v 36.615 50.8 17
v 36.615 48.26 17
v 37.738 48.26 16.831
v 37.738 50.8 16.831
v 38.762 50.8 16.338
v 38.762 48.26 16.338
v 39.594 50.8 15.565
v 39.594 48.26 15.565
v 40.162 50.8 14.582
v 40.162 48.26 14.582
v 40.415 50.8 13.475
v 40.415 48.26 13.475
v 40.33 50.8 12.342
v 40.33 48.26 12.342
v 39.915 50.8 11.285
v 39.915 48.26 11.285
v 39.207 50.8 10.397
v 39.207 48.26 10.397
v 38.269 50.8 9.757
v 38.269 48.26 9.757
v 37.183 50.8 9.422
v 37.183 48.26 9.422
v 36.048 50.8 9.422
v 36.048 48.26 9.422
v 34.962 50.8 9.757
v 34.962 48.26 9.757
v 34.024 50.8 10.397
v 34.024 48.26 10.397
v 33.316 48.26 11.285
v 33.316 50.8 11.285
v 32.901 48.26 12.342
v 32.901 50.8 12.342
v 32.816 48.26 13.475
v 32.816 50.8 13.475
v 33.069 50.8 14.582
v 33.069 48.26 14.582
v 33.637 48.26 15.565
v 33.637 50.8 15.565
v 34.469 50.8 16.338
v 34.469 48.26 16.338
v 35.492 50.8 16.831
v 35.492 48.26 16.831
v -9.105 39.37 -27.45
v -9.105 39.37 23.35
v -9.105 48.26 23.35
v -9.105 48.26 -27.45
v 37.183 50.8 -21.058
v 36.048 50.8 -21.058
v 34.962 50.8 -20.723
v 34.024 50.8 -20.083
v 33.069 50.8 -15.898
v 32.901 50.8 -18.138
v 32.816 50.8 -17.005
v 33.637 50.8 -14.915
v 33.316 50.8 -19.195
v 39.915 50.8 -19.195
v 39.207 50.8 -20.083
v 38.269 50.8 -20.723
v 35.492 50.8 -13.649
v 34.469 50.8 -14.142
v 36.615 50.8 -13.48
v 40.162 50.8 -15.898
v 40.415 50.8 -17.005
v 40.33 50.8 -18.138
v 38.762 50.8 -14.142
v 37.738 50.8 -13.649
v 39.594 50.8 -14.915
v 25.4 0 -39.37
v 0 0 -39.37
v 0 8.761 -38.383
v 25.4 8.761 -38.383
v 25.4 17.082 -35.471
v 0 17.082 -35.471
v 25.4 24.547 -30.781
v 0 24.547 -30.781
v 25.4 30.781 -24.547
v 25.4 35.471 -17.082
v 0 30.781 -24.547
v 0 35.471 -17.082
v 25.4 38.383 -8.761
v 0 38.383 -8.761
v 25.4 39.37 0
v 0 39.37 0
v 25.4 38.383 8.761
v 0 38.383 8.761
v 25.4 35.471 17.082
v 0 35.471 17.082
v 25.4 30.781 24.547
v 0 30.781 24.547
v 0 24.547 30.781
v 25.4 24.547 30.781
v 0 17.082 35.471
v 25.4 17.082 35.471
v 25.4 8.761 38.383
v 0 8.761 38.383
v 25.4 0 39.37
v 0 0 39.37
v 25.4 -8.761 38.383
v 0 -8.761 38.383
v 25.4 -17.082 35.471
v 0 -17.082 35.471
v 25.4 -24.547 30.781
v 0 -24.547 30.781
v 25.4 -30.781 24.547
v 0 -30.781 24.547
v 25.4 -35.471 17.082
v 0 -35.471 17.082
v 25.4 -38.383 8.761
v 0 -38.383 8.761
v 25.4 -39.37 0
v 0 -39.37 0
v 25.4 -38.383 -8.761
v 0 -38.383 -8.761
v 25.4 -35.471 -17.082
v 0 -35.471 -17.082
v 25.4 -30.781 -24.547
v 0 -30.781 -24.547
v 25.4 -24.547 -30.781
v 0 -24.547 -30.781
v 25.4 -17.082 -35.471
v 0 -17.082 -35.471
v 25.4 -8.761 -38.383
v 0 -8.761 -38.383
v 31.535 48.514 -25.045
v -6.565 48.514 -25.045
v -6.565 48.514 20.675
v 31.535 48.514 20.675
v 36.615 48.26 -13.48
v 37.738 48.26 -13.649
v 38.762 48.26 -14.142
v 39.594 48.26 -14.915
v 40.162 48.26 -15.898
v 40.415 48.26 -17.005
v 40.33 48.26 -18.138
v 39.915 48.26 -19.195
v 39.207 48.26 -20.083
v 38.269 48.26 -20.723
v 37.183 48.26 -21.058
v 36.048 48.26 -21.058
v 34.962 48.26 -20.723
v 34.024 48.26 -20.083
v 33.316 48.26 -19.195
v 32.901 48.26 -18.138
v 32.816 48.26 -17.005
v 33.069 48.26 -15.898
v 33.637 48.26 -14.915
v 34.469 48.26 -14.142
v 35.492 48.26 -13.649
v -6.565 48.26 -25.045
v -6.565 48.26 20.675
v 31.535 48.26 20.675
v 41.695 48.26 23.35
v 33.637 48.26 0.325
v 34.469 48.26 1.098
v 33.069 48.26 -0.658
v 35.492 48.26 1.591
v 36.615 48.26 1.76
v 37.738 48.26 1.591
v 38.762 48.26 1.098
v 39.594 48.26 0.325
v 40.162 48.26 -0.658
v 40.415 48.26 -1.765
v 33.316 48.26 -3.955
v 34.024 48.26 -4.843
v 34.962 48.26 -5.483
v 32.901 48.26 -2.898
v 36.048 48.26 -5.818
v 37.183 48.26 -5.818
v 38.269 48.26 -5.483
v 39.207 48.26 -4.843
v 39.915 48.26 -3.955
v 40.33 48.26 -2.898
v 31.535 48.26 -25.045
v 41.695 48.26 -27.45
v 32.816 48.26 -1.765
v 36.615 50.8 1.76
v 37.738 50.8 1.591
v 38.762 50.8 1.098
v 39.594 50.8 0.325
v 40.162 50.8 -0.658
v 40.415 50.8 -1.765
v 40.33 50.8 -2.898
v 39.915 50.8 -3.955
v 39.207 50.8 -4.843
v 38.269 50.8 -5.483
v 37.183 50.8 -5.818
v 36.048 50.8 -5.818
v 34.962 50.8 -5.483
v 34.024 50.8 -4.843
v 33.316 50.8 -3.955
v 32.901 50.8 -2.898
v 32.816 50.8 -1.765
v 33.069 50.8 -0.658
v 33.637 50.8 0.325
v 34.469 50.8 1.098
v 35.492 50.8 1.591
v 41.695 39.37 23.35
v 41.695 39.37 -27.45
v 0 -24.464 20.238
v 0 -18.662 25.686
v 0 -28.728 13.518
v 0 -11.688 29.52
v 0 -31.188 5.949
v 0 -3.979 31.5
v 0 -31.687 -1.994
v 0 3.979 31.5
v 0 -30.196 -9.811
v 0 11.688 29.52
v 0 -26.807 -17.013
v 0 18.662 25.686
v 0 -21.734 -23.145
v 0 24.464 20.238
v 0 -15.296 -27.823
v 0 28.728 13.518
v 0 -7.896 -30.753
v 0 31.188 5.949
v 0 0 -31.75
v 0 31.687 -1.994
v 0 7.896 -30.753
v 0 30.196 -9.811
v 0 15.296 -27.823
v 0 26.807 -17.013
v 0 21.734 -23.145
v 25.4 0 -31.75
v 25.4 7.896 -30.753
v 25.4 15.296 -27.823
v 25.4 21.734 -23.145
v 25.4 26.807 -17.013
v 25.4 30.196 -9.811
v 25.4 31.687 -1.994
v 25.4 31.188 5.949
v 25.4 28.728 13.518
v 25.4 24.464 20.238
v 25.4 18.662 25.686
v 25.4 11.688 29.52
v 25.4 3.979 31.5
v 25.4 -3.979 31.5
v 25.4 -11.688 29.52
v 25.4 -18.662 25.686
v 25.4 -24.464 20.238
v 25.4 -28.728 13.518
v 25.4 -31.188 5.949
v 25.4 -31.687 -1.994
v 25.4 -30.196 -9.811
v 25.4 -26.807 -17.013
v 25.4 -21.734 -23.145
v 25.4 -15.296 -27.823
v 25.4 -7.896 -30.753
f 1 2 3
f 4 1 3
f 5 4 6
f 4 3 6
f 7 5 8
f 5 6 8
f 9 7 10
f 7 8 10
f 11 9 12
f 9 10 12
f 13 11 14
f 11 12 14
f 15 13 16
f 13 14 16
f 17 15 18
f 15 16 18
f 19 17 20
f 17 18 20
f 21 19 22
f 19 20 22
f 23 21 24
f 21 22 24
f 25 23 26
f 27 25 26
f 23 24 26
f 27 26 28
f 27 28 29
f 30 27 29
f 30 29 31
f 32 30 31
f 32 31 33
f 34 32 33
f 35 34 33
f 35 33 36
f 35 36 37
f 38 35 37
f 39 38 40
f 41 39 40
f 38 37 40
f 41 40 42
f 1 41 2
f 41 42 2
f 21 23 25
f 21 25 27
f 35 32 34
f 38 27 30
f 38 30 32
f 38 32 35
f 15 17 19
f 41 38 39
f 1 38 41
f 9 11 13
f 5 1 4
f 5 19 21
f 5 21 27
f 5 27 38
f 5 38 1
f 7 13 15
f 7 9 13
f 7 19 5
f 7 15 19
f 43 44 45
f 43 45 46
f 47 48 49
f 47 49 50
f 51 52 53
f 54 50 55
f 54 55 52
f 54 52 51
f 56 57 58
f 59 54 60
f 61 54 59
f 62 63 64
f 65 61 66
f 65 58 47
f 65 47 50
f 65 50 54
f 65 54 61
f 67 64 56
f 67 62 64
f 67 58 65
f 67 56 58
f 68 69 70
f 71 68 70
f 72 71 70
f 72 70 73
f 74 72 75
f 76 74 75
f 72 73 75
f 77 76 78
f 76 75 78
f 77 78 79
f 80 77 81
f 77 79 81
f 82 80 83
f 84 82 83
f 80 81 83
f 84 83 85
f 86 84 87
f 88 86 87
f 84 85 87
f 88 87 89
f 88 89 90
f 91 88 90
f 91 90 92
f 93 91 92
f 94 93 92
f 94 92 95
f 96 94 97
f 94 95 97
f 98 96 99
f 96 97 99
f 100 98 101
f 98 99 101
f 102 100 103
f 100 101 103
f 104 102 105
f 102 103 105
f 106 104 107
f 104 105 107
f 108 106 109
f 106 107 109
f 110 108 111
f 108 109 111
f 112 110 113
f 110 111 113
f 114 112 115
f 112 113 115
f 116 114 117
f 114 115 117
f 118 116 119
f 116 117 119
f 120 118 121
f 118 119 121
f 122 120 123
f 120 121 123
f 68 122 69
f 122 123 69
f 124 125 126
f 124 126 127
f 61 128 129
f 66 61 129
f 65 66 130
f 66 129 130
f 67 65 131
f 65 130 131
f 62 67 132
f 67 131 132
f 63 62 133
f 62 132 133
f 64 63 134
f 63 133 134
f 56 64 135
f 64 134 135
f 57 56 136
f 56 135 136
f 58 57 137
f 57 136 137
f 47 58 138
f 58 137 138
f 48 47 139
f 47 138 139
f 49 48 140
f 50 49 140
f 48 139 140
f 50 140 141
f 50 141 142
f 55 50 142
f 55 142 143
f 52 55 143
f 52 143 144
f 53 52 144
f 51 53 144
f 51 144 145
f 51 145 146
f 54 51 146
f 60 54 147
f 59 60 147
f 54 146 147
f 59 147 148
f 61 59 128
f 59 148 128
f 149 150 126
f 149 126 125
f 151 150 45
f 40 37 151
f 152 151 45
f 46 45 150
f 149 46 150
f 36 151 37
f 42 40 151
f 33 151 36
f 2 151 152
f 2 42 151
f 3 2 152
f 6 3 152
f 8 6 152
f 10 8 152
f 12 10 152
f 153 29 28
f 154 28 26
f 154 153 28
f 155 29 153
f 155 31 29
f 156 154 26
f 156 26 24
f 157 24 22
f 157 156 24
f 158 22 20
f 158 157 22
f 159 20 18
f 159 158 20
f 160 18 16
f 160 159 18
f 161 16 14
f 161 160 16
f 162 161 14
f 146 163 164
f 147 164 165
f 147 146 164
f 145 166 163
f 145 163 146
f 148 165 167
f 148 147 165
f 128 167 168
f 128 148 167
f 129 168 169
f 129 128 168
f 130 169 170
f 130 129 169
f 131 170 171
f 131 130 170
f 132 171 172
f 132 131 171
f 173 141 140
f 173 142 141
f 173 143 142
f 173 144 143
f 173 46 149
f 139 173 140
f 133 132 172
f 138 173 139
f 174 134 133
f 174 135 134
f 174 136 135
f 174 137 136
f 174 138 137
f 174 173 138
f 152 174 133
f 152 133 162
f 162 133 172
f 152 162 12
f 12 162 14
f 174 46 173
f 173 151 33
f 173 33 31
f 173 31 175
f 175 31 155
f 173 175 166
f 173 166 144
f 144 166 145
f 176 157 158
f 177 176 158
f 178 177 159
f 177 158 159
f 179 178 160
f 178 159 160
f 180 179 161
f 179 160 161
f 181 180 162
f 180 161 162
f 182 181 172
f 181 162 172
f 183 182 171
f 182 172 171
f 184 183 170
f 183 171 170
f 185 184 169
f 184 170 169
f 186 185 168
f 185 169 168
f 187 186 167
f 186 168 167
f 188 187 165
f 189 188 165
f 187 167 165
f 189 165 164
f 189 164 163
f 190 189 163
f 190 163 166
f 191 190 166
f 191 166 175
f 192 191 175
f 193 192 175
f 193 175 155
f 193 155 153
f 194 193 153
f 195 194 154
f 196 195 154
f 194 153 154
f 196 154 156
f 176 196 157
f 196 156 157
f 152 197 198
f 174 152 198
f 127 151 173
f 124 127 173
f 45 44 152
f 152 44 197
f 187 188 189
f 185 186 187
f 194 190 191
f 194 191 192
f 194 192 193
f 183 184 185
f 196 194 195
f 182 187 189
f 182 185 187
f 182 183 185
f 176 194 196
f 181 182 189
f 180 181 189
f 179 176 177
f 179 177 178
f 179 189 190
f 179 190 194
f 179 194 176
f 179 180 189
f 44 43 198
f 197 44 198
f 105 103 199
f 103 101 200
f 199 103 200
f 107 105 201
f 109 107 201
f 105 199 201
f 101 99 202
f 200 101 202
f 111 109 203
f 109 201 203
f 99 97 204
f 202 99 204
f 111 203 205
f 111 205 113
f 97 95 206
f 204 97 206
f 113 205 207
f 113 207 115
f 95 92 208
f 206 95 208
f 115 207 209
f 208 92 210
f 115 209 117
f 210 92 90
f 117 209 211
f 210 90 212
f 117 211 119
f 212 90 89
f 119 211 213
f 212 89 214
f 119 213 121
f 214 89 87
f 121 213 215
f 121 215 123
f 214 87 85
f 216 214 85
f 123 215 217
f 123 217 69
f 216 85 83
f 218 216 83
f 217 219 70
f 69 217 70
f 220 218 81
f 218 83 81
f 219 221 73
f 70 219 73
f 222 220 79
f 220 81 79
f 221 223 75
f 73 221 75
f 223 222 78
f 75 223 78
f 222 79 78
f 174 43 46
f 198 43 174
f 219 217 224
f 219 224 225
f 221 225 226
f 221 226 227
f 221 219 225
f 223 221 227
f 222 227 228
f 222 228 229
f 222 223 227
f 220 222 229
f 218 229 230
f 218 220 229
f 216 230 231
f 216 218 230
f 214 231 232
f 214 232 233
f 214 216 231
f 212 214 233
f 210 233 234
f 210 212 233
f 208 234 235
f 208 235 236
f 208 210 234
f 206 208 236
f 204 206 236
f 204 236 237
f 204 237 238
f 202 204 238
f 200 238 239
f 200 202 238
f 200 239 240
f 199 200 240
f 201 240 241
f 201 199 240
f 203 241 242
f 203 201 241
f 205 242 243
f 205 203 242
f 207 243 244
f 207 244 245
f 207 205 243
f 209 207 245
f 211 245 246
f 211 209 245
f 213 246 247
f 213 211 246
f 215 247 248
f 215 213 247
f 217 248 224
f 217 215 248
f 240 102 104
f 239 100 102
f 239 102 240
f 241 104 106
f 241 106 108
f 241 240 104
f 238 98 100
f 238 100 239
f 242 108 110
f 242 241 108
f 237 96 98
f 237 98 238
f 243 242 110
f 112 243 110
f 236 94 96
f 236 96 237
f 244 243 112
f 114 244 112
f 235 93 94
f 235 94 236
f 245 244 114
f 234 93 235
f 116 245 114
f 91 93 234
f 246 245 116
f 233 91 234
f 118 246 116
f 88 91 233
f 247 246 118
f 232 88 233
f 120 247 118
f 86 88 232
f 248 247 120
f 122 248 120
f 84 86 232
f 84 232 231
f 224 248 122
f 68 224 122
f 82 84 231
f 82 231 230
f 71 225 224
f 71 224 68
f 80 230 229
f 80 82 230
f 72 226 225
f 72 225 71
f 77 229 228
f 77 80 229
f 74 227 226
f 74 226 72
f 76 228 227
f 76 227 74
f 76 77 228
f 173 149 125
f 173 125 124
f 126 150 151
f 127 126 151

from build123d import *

# Parameters (mm, degrees)
SKETCH1_R           = 39.37
SKETCH1_R_2         = 31.75
BOSS_EXTRUDE1_DEPTH = 25.4
SKETCH4_W           = 50.8
SKETCH4_H           = 50.8
BOSS_EXTRUDE3_DEPTH = 8.89
SKETCH5_W           = 38.1
SKETCH5_H           = 45.72
BOSS_EXTRUDE4_DEPTH = 0.254
SKETCH7_R           = 3.81
BOSS_EXTRUDE5_DEPTH = 2.54


with BuildPart() as part:
    # Sketch1 → Boss-Extrude1 (new body)
    with BuildSketch(Plane(origin=(0, 0, 0), x_dir=(0, 0, -1), z_dir=(1, 0, 0))):
        Circle(SKETCH1_R)
        Circle(SKETCH1_R_2, mode=Mode.SUBTRACT)
    extrude(amount=BOSS_EXTRUDE1_DEPTH)


with BuildPart() as body_2:
    # Sketch4 → Boss-Extrude3 (new body)
    with BuildSketch(Plane(origin=(0, 39.37, 0), x_dir=(1, 0, 0), z_dir=(0, 1, 0))):
        with Locations((16.295414044, 2.050192216)):
            Rectangle(SKETCH4_W, SKETCH4_H)
    extrude(amount=BOSS_EXTRUDE3_DEPTH)

    # Sketch5 → Boss-Extrude4 (add)
    with BuildSketch(Plane(origin=(0, 48.26, 0), x_dir=(1, 0, 0), z_dir=(0, 1, 0))):
        with Locations((12.485414044, 2.184535296)):
            Rectangle(SKETCH5_W, SKETCH5_H)
    extrude(amount=BOSS_EXTRUDE4_DEPTH)

    # Sketch7 → Boss-Extrude5 (add)
    with BuildSketch(Plane(origin=(0, 48.26, 0), x_dir=(1, 0, 0), z_dir=(0, 1, 0))):
        with Locations(Location((36.615414044, 17.290192216, 0), (0, 0, 270))):
            Circle(SKETCH7_R)
        with Locations(Location((36.615414044, -13.189807784, 0), (0, 0, 270))):
            Circle(SKETCH7_R)
        with Locations(Location((36.615414044, 2.050192216, 0), (0, 0, 270))):
            Circle(SKETCH7_R)
    extrude(amount=BOSS_EXTRUDE5_DEPTH)


solid = Compound([part.part, body_2.part])
